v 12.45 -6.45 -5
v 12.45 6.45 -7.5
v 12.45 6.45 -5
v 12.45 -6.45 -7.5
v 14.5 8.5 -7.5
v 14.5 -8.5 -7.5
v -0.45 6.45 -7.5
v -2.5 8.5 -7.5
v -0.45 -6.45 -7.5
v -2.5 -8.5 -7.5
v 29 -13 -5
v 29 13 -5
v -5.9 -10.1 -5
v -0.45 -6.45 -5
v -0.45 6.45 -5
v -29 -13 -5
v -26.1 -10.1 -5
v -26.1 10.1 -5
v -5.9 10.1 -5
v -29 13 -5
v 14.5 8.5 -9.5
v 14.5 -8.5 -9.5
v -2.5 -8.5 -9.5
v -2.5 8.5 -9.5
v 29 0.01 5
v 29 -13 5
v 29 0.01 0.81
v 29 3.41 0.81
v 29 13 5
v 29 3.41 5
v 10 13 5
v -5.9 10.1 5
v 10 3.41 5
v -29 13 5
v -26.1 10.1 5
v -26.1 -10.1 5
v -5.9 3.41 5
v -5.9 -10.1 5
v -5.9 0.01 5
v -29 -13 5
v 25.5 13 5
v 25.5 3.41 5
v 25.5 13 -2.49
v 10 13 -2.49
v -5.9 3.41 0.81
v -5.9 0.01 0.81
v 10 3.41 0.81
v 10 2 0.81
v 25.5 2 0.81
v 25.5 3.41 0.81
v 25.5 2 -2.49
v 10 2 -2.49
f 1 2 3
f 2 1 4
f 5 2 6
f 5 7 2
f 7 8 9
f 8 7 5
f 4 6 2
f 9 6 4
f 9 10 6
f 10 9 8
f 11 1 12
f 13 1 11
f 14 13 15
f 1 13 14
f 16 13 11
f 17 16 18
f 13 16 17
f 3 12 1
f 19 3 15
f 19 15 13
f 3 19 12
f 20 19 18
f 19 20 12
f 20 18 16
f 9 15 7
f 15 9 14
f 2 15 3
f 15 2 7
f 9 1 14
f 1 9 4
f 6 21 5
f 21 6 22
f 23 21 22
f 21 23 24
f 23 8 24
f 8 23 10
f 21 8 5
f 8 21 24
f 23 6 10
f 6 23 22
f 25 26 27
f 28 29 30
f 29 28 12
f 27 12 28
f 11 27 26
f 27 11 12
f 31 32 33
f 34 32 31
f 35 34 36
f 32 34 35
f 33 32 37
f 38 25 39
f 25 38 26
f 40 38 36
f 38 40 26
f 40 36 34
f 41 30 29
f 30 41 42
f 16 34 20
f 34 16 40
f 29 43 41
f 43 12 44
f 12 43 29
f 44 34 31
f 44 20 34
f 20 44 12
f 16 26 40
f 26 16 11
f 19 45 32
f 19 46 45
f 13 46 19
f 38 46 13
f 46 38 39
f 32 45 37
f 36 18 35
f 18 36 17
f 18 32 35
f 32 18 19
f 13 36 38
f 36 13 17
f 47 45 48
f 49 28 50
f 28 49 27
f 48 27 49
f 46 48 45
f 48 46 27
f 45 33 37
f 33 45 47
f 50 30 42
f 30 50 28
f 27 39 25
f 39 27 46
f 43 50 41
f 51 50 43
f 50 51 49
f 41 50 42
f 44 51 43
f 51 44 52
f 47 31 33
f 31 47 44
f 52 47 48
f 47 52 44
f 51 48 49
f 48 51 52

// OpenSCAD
module A_HeatSinkCutout() {
  SIZE=[20.2,20.2,7.95];

  translate(SIZE*-.5)
    cube(SIZE);
}

module C_Peg(){
  pegSize = [12.9,12.9,2.5];
  topSize = [17,17,2];

  // square insert
  translate([0,0,2])
  translate([0,0,pegSize[2]]*.5)
  translate(pegSize*-.5)
  cube(pegSize);

  // square insert top
  translate([0,0,2+2.5])
  translate([0,0,topSize[2]]*.5)
  translate(topSize*-.5)
  cube(topSize);
}
  

module Z_HeatSinkBlock() {
  SIZE=[58,26,10];
  difference(){
    union(){
      translate(SIZE*-.5)
        cube(SIZE);
      
      translate([6,0,-3])
      mirror([0,0,1])
      C_Peg();
    }
    
    translate([-16,0,-2]){
      A_HeatSinkCutout();
      translate([0,0,4])
        A_HeatSinkCutout();
    }
    
    translate([10,2,-2.5+.01]) 
    union(){
      translate([-20,-2+0.01,3.3])
        cube([50,3.4,4.2]);      

        cube([15.5,11.5,7.5]);
    }

    
  }
}

Z_HeatSinkBlock();
